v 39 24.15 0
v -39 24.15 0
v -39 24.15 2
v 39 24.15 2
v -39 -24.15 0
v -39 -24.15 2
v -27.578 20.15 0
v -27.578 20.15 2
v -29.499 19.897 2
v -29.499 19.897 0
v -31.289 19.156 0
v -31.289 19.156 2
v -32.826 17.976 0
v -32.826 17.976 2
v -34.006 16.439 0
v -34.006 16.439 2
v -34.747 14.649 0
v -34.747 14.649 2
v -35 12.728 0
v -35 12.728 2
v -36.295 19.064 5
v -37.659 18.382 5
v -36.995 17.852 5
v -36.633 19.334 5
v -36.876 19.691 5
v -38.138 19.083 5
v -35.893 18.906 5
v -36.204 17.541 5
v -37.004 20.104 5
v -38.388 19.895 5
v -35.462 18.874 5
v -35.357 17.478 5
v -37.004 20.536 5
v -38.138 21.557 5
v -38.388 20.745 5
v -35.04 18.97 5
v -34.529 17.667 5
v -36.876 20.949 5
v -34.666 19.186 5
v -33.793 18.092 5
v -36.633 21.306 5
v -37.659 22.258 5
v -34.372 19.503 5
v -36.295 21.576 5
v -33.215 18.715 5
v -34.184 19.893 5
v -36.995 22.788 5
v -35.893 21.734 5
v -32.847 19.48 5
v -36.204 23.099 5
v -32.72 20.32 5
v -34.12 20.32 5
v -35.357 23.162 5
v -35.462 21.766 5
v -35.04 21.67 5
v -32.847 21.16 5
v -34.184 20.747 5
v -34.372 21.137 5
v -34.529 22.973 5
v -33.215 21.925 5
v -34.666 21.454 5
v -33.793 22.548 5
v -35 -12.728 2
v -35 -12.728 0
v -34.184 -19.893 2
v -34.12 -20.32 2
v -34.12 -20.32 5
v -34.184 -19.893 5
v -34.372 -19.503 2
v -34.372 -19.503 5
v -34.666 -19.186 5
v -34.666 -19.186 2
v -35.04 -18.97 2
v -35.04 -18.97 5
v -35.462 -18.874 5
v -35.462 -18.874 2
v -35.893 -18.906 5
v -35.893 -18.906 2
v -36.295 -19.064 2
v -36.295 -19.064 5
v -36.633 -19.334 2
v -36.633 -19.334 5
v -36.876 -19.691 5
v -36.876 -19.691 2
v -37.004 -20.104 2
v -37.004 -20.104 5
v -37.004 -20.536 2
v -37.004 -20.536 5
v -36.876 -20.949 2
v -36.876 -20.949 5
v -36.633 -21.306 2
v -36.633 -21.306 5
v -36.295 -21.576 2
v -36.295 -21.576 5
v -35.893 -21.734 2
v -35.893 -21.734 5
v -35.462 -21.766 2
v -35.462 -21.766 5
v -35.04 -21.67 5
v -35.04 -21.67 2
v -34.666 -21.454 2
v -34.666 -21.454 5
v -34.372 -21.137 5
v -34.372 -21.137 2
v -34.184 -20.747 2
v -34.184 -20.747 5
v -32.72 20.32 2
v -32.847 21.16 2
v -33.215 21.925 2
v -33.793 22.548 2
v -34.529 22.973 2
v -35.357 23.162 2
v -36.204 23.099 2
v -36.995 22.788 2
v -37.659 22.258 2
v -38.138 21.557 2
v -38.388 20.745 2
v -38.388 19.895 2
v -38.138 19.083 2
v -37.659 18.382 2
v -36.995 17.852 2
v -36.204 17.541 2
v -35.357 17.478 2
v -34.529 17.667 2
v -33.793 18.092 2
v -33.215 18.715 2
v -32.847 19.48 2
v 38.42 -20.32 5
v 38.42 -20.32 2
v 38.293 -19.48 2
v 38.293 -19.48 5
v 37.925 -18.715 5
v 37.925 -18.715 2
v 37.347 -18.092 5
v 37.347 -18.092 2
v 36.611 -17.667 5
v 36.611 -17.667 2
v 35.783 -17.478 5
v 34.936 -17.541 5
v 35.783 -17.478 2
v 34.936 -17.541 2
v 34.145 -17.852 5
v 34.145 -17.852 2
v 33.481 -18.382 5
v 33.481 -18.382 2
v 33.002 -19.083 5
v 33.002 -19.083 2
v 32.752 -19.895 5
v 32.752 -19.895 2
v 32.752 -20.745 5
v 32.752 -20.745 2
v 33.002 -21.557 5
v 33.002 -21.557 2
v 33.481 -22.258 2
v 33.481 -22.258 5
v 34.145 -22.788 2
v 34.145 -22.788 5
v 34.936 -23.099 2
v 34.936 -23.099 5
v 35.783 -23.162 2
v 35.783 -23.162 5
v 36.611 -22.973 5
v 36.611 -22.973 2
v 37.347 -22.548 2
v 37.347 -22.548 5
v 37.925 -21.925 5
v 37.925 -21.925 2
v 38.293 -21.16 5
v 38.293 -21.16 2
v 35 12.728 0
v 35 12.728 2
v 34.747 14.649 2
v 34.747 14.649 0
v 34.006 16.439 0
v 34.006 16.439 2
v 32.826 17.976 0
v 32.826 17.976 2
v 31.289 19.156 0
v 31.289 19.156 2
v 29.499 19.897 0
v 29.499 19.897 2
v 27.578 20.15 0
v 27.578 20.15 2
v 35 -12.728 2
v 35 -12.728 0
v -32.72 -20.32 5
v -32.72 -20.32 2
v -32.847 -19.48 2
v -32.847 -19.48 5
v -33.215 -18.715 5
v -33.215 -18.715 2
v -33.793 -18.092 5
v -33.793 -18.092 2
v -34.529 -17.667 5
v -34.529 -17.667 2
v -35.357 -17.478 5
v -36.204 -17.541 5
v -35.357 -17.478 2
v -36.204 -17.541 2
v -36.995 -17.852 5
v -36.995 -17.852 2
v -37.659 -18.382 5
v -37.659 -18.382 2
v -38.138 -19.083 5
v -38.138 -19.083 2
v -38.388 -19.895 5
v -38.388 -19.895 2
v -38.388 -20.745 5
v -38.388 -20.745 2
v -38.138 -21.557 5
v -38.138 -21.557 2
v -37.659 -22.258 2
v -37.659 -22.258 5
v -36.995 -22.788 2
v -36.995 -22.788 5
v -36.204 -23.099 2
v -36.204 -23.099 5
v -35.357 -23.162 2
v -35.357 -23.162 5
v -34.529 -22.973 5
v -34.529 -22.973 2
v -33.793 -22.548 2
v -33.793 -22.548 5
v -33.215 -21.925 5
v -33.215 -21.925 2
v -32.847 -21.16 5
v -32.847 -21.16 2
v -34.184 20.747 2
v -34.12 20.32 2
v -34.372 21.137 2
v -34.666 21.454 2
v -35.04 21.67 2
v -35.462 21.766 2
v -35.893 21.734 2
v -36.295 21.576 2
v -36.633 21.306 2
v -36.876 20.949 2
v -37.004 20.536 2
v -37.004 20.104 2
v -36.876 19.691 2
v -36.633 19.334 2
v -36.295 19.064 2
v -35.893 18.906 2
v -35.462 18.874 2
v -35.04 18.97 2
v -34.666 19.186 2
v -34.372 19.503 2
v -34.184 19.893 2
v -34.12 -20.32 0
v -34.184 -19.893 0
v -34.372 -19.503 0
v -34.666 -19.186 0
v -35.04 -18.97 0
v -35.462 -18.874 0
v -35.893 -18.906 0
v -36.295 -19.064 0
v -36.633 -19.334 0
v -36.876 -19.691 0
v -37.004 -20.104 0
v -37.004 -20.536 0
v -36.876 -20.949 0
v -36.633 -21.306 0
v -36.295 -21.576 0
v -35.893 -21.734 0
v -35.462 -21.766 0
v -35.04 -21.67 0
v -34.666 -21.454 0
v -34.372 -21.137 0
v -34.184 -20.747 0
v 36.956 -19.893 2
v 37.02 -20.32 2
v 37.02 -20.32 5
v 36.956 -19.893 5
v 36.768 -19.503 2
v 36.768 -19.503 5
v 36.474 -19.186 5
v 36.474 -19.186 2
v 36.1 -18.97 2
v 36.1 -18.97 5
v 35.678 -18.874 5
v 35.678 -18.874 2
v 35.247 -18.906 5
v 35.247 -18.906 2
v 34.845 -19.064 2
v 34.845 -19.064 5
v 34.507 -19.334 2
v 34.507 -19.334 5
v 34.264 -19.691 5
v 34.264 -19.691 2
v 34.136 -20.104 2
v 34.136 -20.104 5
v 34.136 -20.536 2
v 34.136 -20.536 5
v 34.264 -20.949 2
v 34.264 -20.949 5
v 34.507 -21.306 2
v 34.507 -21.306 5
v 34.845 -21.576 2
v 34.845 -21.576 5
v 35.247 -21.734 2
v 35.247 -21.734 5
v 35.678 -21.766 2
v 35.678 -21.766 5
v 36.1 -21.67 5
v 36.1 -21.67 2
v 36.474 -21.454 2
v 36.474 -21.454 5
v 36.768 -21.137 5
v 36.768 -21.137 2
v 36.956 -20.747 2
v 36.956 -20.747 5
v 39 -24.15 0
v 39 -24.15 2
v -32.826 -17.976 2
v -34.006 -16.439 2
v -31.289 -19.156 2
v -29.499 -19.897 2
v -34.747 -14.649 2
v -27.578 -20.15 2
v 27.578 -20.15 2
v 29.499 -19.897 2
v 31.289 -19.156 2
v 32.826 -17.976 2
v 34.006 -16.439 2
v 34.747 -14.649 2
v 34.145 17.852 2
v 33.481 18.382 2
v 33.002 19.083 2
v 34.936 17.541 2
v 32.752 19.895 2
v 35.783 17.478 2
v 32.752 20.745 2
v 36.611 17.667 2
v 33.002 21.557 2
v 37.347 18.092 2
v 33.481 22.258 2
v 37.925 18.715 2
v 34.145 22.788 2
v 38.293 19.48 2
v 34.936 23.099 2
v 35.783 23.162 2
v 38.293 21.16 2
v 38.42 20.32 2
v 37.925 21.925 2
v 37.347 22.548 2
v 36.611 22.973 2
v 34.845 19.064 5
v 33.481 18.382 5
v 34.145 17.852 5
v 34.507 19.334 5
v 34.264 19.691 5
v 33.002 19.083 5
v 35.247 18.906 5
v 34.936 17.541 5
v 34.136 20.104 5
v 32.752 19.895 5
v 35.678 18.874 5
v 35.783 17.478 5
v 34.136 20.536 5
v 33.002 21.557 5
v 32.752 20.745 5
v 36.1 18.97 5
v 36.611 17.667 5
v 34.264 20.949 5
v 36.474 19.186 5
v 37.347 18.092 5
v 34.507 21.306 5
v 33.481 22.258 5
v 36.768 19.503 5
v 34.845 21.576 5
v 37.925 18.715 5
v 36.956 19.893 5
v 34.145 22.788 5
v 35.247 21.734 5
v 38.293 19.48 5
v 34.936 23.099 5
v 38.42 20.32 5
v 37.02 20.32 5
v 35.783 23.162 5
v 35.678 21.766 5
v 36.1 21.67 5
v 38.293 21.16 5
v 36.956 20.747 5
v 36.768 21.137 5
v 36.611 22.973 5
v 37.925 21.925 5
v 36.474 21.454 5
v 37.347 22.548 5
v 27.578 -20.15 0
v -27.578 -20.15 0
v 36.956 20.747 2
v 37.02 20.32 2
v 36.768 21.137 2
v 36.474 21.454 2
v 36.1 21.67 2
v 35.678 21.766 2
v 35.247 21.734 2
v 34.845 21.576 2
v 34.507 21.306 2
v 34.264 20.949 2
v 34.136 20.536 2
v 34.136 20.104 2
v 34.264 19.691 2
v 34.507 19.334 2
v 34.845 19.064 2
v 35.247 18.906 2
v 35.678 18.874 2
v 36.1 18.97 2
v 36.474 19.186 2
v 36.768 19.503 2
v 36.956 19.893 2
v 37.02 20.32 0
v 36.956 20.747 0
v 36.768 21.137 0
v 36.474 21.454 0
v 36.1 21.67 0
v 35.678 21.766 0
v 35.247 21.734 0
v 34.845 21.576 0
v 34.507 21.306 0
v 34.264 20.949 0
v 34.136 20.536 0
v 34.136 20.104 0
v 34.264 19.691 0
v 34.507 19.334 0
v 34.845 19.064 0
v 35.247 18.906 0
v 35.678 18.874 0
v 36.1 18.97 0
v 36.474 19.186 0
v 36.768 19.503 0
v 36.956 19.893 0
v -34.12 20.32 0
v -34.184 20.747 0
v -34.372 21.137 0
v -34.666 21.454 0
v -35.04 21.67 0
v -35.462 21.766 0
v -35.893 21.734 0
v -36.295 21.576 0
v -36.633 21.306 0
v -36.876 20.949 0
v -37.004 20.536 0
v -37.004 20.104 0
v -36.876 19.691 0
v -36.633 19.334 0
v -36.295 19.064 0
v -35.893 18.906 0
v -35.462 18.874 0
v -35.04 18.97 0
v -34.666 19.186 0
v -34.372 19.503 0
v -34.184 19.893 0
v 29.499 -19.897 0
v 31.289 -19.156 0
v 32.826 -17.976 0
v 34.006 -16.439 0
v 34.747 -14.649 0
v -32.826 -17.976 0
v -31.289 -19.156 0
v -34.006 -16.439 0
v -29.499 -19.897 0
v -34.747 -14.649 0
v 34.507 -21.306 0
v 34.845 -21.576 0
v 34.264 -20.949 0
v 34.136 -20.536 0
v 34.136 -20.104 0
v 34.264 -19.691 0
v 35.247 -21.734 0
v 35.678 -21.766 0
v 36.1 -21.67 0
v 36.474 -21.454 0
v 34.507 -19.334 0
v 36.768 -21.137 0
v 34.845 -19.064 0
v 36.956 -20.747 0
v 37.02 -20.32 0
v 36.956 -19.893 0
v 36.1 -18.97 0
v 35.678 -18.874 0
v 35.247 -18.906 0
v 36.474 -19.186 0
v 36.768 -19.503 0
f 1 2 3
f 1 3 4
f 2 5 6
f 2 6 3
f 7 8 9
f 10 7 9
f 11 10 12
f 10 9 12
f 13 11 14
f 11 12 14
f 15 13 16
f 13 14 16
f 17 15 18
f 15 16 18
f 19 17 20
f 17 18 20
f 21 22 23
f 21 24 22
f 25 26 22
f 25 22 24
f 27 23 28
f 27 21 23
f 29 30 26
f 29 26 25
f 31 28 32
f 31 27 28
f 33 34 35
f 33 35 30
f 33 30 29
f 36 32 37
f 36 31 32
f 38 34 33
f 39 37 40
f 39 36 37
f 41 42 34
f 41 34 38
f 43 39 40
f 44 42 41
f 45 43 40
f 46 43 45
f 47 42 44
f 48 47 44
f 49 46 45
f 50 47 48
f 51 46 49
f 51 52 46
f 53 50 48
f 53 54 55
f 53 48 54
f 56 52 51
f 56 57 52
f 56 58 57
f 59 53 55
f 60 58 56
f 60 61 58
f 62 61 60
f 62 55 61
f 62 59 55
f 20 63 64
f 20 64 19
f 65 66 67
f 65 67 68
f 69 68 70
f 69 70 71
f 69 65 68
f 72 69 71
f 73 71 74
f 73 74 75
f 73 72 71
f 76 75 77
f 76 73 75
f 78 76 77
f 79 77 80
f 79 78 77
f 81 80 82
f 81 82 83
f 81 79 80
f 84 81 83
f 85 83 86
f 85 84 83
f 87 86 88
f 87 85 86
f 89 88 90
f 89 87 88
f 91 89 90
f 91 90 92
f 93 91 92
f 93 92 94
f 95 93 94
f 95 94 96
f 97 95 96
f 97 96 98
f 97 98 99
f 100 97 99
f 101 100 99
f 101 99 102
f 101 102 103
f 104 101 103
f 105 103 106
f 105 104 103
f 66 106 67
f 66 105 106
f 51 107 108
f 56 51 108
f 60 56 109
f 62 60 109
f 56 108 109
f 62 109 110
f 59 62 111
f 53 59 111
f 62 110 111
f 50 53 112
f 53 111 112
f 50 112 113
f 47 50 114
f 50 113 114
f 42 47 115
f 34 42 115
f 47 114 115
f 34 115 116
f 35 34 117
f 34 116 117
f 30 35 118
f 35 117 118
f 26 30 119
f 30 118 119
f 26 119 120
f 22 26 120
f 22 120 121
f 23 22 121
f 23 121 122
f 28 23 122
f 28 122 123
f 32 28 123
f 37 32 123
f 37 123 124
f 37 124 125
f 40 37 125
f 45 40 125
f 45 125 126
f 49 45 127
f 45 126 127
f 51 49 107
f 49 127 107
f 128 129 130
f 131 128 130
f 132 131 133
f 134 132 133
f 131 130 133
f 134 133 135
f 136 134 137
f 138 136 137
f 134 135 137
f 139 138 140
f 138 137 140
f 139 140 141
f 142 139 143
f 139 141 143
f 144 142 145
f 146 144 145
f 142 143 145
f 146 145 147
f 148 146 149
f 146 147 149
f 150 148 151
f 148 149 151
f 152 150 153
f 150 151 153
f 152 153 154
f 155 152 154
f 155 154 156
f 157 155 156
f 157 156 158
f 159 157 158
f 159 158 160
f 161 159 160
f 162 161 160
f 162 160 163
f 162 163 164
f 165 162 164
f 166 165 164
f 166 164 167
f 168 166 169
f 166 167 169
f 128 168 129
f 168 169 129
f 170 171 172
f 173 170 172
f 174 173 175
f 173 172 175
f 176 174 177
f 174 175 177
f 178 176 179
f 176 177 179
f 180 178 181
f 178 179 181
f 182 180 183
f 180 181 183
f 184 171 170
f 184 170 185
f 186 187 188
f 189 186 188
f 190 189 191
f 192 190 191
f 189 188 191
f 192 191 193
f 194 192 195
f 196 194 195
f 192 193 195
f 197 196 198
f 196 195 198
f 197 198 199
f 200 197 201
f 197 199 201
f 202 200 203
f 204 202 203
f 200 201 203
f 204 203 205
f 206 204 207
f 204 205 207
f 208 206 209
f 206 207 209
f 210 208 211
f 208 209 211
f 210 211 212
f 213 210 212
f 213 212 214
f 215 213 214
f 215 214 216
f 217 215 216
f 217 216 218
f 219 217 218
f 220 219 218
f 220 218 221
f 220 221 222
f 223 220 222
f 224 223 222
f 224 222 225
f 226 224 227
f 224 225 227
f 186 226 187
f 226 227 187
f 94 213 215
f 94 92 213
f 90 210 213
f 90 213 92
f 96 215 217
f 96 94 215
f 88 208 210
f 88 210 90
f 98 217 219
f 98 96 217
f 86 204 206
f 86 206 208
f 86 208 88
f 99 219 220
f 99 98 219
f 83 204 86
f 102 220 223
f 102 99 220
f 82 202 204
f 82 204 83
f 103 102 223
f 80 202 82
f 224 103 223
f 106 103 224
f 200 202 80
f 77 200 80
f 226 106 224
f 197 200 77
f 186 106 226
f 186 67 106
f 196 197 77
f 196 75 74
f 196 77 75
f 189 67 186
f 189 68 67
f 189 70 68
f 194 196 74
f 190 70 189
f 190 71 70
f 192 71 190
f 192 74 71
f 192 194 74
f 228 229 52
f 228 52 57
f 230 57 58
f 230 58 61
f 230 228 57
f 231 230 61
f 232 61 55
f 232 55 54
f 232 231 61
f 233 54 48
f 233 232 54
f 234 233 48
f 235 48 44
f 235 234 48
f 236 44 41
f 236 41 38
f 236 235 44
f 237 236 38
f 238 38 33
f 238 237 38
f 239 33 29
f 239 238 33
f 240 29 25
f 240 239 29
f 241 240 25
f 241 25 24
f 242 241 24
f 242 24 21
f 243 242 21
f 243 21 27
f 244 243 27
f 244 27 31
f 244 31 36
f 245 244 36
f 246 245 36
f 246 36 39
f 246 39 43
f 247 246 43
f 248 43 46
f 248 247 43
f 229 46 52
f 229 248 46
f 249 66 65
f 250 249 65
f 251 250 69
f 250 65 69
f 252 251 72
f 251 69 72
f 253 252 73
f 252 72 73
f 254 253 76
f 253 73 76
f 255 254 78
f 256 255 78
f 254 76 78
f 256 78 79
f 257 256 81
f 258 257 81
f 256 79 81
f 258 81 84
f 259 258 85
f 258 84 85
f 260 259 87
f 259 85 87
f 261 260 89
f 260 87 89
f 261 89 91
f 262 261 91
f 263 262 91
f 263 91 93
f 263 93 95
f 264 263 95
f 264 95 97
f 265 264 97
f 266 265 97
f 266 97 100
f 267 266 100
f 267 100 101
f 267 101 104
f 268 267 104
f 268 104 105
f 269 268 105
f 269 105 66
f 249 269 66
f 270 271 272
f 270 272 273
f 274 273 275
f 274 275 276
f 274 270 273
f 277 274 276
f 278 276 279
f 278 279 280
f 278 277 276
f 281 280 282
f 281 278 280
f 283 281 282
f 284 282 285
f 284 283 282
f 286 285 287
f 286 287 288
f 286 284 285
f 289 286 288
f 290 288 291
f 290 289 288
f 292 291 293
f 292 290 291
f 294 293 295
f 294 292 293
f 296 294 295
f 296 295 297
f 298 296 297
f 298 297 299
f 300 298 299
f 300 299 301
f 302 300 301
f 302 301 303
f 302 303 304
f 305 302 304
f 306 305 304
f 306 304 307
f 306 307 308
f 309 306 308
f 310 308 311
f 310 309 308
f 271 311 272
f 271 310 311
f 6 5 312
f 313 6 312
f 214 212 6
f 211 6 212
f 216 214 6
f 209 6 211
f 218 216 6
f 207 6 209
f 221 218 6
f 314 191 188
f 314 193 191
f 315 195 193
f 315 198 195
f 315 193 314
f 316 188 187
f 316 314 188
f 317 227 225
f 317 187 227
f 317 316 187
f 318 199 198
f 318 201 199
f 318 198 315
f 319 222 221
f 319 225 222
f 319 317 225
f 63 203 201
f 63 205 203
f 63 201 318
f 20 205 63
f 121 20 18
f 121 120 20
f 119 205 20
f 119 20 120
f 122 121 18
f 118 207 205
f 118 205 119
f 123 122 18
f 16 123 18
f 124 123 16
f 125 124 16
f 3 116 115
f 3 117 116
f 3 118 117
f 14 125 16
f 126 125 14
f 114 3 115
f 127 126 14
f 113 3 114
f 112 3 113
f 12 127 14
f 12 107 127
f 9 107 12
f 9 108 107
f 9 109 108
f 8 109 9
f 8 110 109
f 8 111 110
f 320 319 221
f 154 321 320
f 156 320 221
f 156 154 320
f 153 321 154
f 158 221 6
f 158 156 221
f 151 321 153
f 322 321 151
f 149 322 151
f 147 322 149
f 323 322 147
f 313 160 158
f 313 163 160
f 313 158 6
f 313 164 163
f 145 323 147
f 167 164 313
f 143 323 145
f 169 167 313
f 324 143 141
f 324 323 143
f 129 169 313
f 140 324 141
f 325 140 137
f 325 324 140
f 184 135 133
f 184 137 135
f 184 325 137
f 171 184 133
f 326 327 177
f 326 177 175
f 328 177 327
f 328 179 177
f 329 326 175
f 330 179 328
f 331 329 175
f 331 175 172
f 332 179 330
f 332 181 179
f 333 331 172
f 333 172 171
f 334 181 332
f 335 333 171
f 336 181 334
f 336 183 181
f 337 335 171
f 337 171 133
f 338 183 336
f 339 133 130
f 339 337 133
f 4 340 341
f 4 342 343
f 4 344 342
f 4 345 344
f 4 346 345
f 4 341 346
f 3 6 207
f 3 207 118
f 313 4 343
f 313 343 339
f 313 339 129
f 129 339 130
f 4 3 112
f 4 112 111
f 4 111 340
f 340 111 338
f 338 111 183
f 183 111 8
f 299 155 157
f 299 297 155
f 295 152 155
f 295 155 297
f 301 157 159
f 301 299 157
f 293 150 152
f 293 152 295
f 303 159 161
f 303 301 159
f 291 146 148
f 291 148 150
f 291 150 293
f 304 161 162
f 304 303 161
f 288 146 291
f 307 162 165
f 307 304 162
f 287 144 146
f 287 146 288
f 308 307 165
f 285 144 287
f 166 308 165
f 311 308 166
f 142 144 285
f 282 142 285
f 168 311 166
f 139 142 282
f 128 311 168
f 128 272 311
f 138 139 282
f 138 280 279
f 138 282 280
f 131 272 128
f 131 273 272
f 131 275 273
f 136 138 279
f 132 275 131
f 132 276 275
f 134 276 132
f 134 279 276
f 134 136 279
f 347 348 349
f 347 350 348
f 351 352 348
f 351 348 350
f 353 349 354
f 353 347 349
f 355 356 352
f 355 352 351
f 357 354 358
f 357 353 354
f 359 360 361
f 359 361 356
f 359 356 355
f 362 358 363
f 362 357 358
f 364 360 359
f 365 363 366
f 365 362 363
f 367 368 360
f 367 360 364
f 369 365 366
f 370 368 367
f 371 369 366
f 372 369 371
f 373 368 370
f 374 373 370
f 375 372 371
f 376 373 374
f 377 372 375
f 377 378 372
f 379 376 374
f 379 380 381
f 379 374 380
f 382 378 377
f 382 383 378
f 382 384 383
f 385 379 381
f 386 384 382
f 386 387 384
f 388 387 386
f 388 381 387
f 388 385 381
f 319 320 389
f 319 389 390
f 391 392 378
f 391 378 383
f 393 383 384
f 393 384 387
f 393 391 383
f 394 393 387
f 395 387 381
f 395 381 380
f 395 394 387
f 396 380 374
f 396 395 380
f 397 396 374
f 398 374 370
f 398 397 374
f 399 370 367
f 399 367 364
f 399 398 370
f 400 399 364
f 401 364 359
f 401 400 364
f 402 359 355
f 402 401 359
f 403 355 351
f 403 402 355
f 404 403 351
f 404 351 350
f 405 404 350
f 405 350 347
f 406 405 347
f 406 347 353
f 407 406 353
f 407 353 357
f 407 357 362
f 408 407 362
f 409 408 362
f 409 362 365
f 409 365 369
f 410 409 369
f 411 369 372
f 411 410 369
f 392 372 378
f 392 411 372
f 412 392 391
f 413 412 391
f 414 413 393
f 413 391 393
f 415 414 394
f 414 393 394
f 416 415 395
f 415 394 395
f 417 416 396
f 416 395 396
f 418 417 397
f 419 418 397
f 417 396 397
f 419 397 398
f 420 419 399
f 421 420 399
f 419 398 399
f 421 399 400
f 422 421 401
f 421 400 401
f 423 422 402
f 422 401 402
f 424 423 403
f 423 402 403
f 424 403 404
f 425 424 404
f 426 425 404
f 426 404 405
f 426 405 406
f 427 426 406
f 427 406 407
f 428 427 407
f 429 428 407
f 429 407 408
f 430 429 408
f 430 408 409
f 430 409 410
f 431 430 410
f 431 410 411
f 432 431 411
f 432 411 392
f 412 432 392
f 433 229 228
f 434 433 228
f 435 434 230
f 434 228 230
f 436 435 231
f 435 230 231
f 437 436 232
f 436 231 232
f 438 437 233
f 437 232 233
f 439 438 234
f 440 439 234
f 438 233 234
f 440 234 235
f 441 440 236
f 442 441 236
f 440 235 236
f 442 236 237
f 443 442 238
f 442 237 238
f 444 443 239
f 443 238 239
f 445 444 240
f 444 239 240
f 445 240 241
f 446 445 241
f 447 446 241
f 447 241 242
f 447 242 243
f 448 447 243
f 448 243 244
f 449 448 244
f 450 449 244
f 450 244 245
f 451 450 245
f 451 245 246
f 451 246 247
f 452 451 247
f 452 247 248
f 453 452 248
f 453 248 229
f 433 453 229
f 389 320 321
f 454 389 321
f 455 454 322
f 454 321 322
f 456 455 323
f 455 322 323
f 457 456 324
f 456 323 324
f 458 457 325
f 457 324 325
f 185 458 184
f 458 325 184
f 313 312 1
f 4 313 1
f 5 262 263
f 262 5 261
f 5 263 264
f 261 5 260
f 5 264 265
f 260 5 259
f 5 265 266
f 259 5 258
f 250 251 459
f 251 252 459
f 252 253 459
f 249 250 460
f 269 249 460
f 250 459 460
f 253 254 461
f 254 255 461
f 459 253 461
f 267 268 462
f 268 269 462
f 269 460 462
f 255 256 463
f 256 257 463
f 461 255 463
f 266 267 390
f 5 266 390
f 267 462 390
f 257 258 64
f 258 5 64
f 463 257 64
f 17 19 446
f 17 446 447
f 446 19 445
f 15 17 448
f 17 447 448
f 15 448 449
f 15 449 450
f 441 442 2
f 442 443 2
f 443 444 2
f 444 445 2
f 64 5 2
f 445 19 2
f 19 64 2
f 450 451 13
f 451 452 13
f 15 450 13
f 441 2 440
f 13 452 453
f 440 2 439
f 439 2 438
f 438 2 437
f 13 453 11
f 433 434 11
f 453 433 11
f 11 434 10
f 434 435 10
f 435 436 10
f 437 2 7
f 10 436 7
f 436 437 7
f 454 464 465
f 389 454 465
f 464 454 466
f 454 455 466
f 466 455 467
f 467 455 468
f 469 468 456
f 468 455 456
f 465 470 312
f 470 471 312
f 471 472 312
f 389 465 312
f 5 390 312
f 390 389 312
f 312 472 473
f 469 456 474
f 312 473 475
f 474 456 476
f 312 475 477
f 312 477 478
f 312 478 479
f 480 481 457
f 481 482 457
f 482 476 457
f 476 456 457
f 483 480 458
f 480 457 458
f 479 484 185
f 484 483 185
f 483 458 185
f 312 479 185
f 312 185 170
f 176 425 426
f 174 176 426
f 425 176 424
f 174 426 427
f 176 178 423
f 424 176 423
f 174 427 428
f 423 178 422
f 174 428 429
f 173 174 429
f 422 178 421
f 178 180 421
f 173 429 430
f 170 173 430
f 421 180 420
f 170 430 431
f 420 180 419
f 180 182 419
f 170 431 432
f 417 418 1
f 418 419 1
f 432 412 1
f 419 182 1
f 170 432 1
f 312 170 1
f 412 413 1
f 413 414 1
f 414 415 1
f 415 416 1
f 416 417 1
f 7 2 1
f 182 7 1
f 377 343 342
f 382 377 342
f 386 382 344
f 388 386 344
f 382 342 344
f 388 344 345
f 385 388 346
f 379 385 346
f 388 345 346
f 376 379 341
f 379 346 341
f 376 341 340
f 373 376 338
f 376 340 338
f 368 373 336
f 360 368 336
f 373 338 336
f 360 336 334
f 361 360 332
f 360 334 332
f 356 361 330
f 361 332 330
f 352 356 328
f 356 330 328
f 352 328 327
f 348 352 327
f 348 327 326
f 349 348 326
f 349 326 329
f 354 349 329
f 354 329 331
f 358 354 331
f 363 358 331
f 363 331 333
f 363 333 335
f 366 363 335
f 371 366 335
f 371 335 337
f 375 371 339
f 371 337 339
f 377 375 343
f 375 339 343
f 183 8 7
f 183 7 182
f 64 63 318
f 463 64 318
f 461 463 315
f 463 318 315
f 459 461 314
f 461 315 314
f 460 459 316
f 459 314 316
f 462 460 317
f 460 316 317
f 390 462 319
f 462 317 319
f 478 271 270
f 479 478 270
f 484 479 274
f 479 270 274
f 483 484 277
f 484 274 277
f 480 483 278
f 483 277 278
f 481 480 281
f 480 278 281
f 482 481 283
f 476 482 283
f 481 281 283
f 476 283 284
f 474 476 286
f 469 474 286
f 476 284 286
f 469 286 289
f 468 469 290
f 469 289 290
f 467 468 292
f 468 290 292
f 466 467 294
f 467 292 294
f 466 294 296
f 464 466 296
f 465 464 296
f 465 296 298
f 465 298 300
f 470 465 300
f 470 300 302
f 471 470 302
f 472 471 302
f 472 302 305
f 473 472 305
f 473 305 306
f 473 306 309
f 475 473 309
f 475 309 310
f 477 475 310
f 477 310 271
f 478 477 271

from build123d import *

# Parameters (mm, degrees)
SKETCH_W        = 78
SKETCH_H        = 48.3
PAD_DEPTH       = 2
SKETCH001_R     = 1.45
POCKET_DEPTH    = 2.001
SKETCH002_R     = 2.85
SKETCH002_R_2   = 1.45
PAD001_DEPTH    = 3
POCKET001_DEPTH = 2.001


with BuildPart() as part:
    # Sketch → Pad (new body)
    with BuildSketch(Plane.XY):
        Rectangle(SKETCH_W, SKETCH_H)
    extrude(amount=PAD_DEPTH)

    # Sketch001 (on Face6 of Pad) → Pocket (cut, through all)
    with BuildSketch(Plane.XY.offset(2)):
        with Locations((-35.57, 20.32)):
            Circle(SKETCH001_R)
        with Locations((35.57, 20.32)):
            Circle(SKETCH001_R)
        with Locations((-35.57, -20.32)):
            Circle(SKETCH001_R)
        with Locations((35.57, -20.32)):
            Circle(SKETCH001_R)
    extrude(amount=-POCKET_DEPTH, mode=Mode.SUBTRACT)

    # Sketch002 (on Face5 of Pocket) → Pad001 (join)
    with BuildSketch(Plane.XY.offset(2)):
        with Locations((-35.57, 20.32)):
            Circle(SKETCH002_R)
        with Locations((-35.57, 20.32)):
            Circle(SKETCH002_R_2, mode=Mode.SUBTRACT)
        with Locations((35.57, 20.32)):
            Circle(SKETCH002_R)
        with Locations((35.57, 20.32)):
            Circle(SKETCH002_R_2, mode=Mode.SUBTRACT)
        with Locations((35.57, -20.32)):
            Circle(SKETCH002_R)
        with Locations((35.57, -20.32)):
            Circle(SKETCH002_R_2, mode=Mode.SUBTRACT)
        with Locations((-35.57, -20.32)):
            Circle(SKETCH002_R)
        with Locations((-35.57, -20.32)):
            Circle(SKETCH002_R_2, mode=Mode.SUBTRACT)
    extrude(amount=PAD001_DEPTH)

    # Sketch003 (on Face5 of Pad001) → Pocket001 (cut, through all)
    with BuildSketch(Plane.XY.offset(2)):
        with BuildLine():
            Line((-27.578066, 20.15), (27.578066, 20.15))
            ThreePointArc((35, 12.728066), (32.826166, 17.976166), (27.578066, 20.15))
            Line((35, 12.728066), (35, -12.728066))
            ThreePointArc((27.578066, -20.15), (32.826166, -17.976166), (35, -12.728066))
            Line((27.578066, -20.15), (-27.578066, -20.15))
            ThreePointArc((-35, -12.728066), (-32.826166, -17.976166), (-27.578066, -20.15))
            Line((-35, -12.728066), (-35, 12.728066))
            ThreePointArc((-27.578066, 20.15), (-32.826166, 17.976166), (-35, 12.728066))
        make_face()
    extrude(amount=-POCKET001_DEPTH, mode=Mode.SUBTRACT)


solid = part.part
